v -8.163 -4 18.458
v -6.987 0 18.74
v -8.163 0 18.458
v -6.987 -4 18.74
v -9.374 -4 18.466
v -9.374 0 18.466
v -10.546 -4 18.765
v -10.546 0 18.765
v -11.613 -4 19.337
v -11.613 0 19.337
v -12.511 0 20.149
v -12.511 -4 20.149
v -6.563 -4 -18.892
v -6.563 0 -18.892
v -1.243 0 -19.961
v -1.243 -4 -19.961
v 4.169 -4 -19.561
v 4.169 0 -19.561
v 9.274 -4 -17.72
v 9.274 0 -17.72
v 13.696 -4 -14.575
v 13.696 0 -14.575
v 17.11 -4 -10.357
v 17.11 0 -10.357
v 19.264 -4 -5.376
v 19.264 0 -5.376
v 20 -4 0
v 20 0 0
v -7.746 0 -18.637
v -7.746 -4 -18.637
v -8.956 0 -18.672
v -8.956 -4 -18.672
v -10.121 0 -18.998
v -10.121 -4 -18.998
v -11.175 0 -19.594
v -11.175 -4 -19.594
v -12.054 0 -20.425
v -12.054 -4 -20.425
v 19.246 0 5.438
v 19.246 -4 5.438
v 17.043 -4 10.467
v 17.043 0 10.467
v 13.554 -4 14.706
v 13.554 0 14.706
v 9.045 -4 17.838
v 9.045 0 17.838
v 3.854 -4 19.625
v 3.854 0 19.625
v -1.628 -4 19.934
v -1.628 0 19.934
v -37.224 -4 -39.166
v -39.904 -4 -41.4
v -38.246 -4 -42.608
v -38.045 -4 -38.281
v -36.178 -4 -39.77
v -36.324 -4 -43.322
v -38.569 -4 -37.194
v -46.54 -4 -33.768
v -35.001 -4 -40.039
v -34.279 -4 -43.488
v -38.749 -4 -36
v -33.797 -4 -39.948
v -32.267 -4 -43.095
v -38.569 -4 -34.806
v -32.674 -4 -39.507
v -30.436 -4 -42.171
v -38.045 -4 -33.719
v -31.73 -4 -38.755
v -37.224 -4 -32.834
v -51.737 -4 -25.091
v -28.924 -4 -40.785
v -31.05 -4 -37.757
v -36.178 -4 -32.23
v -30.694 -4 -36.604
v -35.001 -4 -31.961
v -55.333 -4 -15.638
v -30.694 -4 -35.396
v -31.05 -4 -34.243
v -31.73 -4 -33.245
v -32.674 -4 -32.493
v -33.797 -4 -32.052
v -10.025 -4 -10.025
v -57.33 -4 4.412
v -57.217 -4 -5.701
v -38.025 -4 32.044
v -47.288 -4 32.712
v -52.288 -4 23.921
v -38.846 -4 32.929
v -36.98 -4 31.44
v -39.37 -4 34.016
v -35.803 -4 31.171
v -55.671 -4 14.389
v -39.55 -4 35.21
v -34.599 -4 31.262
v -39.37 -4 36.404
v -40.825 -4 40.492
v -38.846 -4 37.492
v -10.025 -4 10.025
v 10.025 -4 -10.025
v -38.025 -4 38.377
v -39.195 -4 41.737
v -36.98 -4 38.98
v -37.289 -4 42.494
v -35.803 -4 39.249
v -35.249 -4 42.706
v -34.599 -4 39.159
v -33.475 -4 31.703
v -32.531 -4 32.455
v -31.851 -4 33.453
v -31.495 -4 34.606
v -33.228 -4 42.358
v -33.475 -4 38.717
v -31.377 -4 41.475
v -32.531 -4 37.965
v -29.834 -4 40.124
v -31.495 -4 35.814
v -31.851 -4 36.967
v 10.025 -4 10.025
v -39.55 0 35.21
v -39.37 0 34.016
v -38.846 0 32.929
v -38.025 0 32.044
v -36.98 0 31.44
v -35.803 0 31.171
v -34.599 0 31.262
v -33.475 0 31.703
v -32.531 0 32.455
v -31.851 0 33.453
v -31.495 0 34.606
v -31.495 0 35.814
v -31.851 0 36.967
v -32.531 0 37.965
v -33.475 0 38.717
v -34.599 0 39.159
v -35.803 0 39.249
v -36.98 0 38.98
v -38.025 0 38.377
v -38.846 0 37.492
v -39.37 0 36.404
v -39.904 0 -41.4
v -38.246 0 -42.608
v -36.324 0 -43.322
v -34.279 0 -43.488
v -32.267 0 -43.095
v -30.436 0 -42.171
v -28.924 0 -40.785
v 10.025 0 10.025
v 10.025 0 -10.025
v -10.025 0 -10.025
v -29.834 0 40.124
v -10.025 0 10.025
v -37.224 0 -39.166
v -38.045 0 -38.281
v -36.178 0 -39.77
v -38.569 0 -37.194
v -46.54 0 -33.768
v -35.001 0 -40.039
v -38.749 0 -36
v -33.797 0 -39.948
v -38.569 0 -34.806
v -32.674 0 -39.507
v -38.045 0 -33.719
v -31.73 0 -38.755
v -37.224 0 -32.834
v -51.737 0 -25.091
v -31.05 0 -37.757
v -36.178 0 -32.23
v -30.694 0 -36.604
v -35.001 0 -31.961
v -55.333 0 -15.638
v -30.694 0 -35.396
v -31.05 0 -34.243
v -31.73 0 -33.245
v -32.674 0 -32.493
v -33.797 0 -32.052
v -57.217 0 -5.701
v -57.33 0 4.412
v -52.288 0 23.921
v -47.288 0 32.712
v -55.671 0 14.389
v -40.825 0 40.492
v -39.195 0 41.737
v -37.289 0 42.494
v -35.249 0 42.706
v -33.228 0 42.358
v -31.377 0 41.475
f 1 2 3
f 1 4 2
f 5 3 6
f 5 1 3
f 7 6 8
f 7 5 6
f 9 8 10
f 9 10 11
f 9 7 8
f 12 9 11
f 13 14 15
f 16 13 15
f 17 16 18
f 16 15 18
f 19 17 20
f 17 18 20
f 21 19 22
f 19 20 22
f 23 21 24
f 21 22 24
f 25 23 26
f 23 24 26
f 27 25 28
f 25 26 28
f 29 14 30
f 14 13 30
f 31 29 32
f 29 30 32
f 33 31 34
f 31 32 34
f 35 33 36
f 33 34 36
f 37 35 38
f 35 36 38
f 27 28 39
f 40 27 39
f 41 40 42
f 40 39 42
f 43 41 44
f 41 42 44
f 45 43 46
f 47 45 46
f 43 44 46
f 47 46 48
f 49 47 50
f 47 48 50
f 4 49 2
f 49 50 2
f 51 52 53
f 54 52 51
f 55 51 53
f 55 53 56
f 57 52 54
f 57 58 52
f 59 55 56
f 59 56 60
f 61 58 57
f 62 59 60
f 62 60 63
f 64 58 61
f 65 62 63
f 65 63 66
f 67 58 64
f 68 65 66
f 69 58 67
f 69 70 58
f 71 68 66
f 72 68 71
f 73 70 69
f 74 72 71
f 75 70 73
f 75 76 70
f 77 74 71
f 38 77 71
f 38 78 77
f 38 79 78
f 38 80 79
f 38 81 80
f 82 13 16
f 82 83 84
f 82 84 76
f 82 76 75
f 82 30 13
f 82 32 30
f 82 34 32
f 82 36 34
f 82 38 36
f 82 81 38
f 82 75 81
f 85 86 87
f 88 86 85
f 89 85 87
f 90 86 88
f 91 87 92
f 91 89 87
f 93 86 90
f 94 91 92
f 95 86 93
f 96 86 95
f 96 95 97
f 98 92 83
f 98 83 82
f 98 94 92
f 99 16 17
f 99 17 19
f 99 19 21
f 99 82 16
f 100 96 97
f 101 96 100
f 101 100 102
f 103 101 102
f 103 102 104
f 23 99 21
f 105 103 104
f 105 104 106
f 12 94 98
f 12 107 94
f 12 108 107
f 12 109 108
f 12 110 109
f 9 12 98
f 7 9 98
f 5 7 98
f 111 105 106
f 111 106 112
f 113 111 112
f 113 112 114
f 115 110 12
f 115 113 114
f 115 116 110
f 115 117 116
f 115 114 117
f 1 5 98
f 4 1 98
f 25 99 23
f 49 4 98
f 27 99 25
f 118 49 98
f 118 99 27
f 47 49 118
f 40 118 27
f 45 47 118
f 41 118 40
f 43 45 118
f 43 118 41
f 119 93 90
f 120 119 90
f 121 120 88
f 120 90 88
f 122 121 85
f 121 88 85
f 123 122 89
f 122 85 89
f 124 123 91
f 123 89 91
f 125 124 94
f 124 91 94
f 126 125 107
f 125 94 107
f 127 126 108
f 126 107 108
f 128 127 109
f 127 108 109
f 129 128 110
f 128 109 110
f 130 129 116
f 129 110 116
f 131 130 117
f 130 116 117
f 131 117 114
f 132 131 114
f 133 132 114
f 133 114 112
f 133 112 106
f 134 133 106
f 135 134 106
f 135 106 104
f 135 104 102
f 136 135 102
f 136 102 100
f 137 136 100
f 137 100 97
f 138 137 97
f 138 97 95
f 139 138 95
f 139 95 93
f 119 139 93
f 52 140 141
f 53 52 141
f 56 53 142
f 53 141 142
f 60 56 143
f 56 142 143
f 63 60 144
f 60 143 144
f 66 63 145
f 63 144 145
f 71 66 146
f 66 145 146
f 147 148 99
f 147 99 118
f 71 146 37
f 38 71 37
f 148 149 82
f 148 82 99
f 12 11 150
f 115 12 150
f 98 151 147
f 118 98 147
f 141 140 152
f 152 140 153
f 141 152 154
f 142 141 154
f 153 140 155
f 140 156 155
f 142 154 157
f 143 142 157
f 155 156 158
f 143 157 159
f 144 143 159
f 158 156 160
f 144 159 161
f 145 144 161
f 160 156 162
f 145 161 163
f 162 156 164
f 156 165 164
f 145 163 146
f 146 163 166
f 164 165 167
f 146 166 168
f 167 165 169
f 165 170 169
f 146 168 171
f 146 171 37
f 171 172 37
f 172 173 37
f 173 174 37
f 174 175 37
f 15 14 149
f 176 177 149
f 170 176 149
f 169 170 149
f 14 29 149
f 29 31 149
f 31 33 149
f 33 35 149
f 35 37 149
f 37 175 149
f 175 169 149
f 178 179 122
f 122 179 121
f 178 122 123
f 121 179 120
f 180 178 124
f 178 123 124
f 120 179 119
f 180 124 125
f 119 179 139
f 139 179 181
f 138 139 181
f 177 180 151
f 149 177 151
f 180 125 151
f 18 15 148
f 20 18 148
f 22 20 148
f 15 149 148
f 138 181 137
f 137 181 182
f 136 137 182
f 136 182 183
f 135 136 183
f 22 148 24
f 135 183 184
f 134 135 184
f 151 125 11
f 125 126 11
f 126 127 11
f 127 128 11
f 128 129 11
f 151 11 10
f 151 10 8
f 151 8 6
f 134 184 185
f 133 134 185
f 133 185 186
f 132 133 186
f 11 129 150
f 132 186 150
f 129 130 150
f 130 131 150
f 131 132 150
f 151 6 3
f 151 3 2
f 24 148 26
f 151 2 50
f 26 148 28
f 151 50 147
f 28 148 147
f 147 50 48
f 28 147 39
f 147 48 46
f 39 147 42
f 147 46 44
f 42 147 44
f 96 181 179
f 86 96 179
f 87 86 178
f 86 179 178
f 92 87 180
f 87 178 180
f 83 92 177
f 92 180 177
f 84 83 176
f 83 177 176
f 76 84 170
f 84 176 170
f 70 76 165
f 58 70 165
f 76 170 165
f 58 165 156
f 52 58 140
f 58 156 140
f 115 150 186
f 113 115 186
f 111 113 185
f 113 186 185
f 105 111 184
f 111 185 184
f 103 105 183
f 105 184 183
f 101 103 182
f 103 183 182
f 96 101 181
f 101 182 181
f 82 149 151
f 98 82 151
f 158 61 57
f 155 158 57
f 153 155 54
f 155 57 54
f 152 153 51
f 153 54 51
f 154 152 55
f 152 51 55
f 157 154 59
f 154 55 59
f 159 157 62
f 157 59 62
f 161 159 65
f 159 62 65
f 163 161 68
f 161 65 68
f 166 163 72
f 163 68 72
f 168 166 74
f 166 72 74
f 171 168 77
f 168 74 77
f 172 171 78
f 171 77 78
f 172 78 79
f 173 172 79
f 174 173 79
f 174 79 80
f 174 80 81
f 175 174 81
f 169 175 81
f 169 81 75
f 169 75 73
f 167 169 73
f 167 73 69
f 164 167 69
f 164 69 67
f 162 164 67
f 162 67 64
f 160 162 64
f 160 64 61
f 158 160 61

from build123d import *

# Parameters (mm, degrees)
F0_W     = 20.05
F0_H     = 20.05
F1_DEPTH = 4
F2_D     = 8.1
F3_R     = 5


with BuildPart() as f1:
    # F0 (on Front) → F1 (new body)
    with BuildSketch(Plane.XZ):
        with BuildLine():
            ThreePointArc((-9.6465038341, -17.519844856), (10.1752131014, -17.2181601323), (20, 0))
            ThreePointArc((20, 0), (9.9808325833, 17.331560257), (-10.0382980944, 17.2983401333))
            ThreePointArc((-10.0382980944, 17.2983401333), (-19.9987339156, -0.2250372661), (-9.6465038341, -17.519844856))
        make_face()
        Rectangle(F0_W, F0_H, mode=Mode.SUBTRACT)
        with BuildLine():
            ThreePointArc((-9.6465038341, -17.519844856), (-19.9987339156, -0.2250372661), (-10.0382980944, 17.2983401333))
            Line((-10.0382980944, 17.2983401333), (-29.8339876344, 40.1239726576))
            ThreePointArc((-29.8339876344, 40.1239726576), (-28.4734399333, 37.8325737503), (-28, 35.2100837829))
            ThreePointArc((-28, 35.2100837829), (-38.3559150153, 28.275118071), (-40.8249998468, 40.4915965048))
            ThreePointArc((-40.8249998468, 40.4915965048), (-57.4963600088, -0.6469820224), (-39.9035086306, -41.3999999875))
            ThreePointArc((-39.9035086306, -41.3999999875), (-37.6324685474, -29.09760762), (-27.1987031458, -36))
            ThreePointArc((-27.1987031458, -36), (-27.6430799913, -38.5432620593), (-28.9235516531, -40.785146313))
            Line((-28.9235516531, -40.785146313), (-9.6465038341, -17.519844856))
        make_face()
        with BuildLine():
            ThreePointArc((-28, 35.2100837829), (-28.4734399333, 37.8325737503), (-29.8339876344, 40.1239726576))
            ThreePointArc((-29.8339876344, 40.1239726576), (-35.2492826138, 42.7058919977), (-40.8249998468, 40.4915965048))
            ThreePointArc((-40.8249998468, 40.4915965048), (-38.3559150153, 28.275118071), (-28, 35.2100837829))
        make_face()
        with BuildLine():
            ThreePointArc((-39.9035086306, -41.3999999875), (-34.2793764206, -43.488268498), (-28.9235516531, -40.785146313))
            ThreePointArc((-28.9235516531, -40.785146313), (-27.6430799913, -38.5432620593), (-27.1987031458, -36))
            ThreePointArc((-27.1987031458, -36), (-37.6324685474, -29.09760762), (-39.9035086306, -41.3999999875))
        make_face()
    extrude(amount=F1_DEPTH)

    # F2 (through all)
    with Locations(Plane(origin=(0, 0, 0), x_dir=(1, 0, 0), z_dir=(0, 1, 0))):
        with Locations((-34.6987031458, 36), (-35.5, -35.2100837829)):
            Hole(F2_D / 2)

    # F3
    f3_edges = [f1.edges().sort_by_distance(p)[0] for p in [
        (-10.038298, -2, 17.29834),
        (-9.646504, -2, -17.519845),
    ]]
    fillet(f3_edges, radius=F3_R)


solid = f1.part
